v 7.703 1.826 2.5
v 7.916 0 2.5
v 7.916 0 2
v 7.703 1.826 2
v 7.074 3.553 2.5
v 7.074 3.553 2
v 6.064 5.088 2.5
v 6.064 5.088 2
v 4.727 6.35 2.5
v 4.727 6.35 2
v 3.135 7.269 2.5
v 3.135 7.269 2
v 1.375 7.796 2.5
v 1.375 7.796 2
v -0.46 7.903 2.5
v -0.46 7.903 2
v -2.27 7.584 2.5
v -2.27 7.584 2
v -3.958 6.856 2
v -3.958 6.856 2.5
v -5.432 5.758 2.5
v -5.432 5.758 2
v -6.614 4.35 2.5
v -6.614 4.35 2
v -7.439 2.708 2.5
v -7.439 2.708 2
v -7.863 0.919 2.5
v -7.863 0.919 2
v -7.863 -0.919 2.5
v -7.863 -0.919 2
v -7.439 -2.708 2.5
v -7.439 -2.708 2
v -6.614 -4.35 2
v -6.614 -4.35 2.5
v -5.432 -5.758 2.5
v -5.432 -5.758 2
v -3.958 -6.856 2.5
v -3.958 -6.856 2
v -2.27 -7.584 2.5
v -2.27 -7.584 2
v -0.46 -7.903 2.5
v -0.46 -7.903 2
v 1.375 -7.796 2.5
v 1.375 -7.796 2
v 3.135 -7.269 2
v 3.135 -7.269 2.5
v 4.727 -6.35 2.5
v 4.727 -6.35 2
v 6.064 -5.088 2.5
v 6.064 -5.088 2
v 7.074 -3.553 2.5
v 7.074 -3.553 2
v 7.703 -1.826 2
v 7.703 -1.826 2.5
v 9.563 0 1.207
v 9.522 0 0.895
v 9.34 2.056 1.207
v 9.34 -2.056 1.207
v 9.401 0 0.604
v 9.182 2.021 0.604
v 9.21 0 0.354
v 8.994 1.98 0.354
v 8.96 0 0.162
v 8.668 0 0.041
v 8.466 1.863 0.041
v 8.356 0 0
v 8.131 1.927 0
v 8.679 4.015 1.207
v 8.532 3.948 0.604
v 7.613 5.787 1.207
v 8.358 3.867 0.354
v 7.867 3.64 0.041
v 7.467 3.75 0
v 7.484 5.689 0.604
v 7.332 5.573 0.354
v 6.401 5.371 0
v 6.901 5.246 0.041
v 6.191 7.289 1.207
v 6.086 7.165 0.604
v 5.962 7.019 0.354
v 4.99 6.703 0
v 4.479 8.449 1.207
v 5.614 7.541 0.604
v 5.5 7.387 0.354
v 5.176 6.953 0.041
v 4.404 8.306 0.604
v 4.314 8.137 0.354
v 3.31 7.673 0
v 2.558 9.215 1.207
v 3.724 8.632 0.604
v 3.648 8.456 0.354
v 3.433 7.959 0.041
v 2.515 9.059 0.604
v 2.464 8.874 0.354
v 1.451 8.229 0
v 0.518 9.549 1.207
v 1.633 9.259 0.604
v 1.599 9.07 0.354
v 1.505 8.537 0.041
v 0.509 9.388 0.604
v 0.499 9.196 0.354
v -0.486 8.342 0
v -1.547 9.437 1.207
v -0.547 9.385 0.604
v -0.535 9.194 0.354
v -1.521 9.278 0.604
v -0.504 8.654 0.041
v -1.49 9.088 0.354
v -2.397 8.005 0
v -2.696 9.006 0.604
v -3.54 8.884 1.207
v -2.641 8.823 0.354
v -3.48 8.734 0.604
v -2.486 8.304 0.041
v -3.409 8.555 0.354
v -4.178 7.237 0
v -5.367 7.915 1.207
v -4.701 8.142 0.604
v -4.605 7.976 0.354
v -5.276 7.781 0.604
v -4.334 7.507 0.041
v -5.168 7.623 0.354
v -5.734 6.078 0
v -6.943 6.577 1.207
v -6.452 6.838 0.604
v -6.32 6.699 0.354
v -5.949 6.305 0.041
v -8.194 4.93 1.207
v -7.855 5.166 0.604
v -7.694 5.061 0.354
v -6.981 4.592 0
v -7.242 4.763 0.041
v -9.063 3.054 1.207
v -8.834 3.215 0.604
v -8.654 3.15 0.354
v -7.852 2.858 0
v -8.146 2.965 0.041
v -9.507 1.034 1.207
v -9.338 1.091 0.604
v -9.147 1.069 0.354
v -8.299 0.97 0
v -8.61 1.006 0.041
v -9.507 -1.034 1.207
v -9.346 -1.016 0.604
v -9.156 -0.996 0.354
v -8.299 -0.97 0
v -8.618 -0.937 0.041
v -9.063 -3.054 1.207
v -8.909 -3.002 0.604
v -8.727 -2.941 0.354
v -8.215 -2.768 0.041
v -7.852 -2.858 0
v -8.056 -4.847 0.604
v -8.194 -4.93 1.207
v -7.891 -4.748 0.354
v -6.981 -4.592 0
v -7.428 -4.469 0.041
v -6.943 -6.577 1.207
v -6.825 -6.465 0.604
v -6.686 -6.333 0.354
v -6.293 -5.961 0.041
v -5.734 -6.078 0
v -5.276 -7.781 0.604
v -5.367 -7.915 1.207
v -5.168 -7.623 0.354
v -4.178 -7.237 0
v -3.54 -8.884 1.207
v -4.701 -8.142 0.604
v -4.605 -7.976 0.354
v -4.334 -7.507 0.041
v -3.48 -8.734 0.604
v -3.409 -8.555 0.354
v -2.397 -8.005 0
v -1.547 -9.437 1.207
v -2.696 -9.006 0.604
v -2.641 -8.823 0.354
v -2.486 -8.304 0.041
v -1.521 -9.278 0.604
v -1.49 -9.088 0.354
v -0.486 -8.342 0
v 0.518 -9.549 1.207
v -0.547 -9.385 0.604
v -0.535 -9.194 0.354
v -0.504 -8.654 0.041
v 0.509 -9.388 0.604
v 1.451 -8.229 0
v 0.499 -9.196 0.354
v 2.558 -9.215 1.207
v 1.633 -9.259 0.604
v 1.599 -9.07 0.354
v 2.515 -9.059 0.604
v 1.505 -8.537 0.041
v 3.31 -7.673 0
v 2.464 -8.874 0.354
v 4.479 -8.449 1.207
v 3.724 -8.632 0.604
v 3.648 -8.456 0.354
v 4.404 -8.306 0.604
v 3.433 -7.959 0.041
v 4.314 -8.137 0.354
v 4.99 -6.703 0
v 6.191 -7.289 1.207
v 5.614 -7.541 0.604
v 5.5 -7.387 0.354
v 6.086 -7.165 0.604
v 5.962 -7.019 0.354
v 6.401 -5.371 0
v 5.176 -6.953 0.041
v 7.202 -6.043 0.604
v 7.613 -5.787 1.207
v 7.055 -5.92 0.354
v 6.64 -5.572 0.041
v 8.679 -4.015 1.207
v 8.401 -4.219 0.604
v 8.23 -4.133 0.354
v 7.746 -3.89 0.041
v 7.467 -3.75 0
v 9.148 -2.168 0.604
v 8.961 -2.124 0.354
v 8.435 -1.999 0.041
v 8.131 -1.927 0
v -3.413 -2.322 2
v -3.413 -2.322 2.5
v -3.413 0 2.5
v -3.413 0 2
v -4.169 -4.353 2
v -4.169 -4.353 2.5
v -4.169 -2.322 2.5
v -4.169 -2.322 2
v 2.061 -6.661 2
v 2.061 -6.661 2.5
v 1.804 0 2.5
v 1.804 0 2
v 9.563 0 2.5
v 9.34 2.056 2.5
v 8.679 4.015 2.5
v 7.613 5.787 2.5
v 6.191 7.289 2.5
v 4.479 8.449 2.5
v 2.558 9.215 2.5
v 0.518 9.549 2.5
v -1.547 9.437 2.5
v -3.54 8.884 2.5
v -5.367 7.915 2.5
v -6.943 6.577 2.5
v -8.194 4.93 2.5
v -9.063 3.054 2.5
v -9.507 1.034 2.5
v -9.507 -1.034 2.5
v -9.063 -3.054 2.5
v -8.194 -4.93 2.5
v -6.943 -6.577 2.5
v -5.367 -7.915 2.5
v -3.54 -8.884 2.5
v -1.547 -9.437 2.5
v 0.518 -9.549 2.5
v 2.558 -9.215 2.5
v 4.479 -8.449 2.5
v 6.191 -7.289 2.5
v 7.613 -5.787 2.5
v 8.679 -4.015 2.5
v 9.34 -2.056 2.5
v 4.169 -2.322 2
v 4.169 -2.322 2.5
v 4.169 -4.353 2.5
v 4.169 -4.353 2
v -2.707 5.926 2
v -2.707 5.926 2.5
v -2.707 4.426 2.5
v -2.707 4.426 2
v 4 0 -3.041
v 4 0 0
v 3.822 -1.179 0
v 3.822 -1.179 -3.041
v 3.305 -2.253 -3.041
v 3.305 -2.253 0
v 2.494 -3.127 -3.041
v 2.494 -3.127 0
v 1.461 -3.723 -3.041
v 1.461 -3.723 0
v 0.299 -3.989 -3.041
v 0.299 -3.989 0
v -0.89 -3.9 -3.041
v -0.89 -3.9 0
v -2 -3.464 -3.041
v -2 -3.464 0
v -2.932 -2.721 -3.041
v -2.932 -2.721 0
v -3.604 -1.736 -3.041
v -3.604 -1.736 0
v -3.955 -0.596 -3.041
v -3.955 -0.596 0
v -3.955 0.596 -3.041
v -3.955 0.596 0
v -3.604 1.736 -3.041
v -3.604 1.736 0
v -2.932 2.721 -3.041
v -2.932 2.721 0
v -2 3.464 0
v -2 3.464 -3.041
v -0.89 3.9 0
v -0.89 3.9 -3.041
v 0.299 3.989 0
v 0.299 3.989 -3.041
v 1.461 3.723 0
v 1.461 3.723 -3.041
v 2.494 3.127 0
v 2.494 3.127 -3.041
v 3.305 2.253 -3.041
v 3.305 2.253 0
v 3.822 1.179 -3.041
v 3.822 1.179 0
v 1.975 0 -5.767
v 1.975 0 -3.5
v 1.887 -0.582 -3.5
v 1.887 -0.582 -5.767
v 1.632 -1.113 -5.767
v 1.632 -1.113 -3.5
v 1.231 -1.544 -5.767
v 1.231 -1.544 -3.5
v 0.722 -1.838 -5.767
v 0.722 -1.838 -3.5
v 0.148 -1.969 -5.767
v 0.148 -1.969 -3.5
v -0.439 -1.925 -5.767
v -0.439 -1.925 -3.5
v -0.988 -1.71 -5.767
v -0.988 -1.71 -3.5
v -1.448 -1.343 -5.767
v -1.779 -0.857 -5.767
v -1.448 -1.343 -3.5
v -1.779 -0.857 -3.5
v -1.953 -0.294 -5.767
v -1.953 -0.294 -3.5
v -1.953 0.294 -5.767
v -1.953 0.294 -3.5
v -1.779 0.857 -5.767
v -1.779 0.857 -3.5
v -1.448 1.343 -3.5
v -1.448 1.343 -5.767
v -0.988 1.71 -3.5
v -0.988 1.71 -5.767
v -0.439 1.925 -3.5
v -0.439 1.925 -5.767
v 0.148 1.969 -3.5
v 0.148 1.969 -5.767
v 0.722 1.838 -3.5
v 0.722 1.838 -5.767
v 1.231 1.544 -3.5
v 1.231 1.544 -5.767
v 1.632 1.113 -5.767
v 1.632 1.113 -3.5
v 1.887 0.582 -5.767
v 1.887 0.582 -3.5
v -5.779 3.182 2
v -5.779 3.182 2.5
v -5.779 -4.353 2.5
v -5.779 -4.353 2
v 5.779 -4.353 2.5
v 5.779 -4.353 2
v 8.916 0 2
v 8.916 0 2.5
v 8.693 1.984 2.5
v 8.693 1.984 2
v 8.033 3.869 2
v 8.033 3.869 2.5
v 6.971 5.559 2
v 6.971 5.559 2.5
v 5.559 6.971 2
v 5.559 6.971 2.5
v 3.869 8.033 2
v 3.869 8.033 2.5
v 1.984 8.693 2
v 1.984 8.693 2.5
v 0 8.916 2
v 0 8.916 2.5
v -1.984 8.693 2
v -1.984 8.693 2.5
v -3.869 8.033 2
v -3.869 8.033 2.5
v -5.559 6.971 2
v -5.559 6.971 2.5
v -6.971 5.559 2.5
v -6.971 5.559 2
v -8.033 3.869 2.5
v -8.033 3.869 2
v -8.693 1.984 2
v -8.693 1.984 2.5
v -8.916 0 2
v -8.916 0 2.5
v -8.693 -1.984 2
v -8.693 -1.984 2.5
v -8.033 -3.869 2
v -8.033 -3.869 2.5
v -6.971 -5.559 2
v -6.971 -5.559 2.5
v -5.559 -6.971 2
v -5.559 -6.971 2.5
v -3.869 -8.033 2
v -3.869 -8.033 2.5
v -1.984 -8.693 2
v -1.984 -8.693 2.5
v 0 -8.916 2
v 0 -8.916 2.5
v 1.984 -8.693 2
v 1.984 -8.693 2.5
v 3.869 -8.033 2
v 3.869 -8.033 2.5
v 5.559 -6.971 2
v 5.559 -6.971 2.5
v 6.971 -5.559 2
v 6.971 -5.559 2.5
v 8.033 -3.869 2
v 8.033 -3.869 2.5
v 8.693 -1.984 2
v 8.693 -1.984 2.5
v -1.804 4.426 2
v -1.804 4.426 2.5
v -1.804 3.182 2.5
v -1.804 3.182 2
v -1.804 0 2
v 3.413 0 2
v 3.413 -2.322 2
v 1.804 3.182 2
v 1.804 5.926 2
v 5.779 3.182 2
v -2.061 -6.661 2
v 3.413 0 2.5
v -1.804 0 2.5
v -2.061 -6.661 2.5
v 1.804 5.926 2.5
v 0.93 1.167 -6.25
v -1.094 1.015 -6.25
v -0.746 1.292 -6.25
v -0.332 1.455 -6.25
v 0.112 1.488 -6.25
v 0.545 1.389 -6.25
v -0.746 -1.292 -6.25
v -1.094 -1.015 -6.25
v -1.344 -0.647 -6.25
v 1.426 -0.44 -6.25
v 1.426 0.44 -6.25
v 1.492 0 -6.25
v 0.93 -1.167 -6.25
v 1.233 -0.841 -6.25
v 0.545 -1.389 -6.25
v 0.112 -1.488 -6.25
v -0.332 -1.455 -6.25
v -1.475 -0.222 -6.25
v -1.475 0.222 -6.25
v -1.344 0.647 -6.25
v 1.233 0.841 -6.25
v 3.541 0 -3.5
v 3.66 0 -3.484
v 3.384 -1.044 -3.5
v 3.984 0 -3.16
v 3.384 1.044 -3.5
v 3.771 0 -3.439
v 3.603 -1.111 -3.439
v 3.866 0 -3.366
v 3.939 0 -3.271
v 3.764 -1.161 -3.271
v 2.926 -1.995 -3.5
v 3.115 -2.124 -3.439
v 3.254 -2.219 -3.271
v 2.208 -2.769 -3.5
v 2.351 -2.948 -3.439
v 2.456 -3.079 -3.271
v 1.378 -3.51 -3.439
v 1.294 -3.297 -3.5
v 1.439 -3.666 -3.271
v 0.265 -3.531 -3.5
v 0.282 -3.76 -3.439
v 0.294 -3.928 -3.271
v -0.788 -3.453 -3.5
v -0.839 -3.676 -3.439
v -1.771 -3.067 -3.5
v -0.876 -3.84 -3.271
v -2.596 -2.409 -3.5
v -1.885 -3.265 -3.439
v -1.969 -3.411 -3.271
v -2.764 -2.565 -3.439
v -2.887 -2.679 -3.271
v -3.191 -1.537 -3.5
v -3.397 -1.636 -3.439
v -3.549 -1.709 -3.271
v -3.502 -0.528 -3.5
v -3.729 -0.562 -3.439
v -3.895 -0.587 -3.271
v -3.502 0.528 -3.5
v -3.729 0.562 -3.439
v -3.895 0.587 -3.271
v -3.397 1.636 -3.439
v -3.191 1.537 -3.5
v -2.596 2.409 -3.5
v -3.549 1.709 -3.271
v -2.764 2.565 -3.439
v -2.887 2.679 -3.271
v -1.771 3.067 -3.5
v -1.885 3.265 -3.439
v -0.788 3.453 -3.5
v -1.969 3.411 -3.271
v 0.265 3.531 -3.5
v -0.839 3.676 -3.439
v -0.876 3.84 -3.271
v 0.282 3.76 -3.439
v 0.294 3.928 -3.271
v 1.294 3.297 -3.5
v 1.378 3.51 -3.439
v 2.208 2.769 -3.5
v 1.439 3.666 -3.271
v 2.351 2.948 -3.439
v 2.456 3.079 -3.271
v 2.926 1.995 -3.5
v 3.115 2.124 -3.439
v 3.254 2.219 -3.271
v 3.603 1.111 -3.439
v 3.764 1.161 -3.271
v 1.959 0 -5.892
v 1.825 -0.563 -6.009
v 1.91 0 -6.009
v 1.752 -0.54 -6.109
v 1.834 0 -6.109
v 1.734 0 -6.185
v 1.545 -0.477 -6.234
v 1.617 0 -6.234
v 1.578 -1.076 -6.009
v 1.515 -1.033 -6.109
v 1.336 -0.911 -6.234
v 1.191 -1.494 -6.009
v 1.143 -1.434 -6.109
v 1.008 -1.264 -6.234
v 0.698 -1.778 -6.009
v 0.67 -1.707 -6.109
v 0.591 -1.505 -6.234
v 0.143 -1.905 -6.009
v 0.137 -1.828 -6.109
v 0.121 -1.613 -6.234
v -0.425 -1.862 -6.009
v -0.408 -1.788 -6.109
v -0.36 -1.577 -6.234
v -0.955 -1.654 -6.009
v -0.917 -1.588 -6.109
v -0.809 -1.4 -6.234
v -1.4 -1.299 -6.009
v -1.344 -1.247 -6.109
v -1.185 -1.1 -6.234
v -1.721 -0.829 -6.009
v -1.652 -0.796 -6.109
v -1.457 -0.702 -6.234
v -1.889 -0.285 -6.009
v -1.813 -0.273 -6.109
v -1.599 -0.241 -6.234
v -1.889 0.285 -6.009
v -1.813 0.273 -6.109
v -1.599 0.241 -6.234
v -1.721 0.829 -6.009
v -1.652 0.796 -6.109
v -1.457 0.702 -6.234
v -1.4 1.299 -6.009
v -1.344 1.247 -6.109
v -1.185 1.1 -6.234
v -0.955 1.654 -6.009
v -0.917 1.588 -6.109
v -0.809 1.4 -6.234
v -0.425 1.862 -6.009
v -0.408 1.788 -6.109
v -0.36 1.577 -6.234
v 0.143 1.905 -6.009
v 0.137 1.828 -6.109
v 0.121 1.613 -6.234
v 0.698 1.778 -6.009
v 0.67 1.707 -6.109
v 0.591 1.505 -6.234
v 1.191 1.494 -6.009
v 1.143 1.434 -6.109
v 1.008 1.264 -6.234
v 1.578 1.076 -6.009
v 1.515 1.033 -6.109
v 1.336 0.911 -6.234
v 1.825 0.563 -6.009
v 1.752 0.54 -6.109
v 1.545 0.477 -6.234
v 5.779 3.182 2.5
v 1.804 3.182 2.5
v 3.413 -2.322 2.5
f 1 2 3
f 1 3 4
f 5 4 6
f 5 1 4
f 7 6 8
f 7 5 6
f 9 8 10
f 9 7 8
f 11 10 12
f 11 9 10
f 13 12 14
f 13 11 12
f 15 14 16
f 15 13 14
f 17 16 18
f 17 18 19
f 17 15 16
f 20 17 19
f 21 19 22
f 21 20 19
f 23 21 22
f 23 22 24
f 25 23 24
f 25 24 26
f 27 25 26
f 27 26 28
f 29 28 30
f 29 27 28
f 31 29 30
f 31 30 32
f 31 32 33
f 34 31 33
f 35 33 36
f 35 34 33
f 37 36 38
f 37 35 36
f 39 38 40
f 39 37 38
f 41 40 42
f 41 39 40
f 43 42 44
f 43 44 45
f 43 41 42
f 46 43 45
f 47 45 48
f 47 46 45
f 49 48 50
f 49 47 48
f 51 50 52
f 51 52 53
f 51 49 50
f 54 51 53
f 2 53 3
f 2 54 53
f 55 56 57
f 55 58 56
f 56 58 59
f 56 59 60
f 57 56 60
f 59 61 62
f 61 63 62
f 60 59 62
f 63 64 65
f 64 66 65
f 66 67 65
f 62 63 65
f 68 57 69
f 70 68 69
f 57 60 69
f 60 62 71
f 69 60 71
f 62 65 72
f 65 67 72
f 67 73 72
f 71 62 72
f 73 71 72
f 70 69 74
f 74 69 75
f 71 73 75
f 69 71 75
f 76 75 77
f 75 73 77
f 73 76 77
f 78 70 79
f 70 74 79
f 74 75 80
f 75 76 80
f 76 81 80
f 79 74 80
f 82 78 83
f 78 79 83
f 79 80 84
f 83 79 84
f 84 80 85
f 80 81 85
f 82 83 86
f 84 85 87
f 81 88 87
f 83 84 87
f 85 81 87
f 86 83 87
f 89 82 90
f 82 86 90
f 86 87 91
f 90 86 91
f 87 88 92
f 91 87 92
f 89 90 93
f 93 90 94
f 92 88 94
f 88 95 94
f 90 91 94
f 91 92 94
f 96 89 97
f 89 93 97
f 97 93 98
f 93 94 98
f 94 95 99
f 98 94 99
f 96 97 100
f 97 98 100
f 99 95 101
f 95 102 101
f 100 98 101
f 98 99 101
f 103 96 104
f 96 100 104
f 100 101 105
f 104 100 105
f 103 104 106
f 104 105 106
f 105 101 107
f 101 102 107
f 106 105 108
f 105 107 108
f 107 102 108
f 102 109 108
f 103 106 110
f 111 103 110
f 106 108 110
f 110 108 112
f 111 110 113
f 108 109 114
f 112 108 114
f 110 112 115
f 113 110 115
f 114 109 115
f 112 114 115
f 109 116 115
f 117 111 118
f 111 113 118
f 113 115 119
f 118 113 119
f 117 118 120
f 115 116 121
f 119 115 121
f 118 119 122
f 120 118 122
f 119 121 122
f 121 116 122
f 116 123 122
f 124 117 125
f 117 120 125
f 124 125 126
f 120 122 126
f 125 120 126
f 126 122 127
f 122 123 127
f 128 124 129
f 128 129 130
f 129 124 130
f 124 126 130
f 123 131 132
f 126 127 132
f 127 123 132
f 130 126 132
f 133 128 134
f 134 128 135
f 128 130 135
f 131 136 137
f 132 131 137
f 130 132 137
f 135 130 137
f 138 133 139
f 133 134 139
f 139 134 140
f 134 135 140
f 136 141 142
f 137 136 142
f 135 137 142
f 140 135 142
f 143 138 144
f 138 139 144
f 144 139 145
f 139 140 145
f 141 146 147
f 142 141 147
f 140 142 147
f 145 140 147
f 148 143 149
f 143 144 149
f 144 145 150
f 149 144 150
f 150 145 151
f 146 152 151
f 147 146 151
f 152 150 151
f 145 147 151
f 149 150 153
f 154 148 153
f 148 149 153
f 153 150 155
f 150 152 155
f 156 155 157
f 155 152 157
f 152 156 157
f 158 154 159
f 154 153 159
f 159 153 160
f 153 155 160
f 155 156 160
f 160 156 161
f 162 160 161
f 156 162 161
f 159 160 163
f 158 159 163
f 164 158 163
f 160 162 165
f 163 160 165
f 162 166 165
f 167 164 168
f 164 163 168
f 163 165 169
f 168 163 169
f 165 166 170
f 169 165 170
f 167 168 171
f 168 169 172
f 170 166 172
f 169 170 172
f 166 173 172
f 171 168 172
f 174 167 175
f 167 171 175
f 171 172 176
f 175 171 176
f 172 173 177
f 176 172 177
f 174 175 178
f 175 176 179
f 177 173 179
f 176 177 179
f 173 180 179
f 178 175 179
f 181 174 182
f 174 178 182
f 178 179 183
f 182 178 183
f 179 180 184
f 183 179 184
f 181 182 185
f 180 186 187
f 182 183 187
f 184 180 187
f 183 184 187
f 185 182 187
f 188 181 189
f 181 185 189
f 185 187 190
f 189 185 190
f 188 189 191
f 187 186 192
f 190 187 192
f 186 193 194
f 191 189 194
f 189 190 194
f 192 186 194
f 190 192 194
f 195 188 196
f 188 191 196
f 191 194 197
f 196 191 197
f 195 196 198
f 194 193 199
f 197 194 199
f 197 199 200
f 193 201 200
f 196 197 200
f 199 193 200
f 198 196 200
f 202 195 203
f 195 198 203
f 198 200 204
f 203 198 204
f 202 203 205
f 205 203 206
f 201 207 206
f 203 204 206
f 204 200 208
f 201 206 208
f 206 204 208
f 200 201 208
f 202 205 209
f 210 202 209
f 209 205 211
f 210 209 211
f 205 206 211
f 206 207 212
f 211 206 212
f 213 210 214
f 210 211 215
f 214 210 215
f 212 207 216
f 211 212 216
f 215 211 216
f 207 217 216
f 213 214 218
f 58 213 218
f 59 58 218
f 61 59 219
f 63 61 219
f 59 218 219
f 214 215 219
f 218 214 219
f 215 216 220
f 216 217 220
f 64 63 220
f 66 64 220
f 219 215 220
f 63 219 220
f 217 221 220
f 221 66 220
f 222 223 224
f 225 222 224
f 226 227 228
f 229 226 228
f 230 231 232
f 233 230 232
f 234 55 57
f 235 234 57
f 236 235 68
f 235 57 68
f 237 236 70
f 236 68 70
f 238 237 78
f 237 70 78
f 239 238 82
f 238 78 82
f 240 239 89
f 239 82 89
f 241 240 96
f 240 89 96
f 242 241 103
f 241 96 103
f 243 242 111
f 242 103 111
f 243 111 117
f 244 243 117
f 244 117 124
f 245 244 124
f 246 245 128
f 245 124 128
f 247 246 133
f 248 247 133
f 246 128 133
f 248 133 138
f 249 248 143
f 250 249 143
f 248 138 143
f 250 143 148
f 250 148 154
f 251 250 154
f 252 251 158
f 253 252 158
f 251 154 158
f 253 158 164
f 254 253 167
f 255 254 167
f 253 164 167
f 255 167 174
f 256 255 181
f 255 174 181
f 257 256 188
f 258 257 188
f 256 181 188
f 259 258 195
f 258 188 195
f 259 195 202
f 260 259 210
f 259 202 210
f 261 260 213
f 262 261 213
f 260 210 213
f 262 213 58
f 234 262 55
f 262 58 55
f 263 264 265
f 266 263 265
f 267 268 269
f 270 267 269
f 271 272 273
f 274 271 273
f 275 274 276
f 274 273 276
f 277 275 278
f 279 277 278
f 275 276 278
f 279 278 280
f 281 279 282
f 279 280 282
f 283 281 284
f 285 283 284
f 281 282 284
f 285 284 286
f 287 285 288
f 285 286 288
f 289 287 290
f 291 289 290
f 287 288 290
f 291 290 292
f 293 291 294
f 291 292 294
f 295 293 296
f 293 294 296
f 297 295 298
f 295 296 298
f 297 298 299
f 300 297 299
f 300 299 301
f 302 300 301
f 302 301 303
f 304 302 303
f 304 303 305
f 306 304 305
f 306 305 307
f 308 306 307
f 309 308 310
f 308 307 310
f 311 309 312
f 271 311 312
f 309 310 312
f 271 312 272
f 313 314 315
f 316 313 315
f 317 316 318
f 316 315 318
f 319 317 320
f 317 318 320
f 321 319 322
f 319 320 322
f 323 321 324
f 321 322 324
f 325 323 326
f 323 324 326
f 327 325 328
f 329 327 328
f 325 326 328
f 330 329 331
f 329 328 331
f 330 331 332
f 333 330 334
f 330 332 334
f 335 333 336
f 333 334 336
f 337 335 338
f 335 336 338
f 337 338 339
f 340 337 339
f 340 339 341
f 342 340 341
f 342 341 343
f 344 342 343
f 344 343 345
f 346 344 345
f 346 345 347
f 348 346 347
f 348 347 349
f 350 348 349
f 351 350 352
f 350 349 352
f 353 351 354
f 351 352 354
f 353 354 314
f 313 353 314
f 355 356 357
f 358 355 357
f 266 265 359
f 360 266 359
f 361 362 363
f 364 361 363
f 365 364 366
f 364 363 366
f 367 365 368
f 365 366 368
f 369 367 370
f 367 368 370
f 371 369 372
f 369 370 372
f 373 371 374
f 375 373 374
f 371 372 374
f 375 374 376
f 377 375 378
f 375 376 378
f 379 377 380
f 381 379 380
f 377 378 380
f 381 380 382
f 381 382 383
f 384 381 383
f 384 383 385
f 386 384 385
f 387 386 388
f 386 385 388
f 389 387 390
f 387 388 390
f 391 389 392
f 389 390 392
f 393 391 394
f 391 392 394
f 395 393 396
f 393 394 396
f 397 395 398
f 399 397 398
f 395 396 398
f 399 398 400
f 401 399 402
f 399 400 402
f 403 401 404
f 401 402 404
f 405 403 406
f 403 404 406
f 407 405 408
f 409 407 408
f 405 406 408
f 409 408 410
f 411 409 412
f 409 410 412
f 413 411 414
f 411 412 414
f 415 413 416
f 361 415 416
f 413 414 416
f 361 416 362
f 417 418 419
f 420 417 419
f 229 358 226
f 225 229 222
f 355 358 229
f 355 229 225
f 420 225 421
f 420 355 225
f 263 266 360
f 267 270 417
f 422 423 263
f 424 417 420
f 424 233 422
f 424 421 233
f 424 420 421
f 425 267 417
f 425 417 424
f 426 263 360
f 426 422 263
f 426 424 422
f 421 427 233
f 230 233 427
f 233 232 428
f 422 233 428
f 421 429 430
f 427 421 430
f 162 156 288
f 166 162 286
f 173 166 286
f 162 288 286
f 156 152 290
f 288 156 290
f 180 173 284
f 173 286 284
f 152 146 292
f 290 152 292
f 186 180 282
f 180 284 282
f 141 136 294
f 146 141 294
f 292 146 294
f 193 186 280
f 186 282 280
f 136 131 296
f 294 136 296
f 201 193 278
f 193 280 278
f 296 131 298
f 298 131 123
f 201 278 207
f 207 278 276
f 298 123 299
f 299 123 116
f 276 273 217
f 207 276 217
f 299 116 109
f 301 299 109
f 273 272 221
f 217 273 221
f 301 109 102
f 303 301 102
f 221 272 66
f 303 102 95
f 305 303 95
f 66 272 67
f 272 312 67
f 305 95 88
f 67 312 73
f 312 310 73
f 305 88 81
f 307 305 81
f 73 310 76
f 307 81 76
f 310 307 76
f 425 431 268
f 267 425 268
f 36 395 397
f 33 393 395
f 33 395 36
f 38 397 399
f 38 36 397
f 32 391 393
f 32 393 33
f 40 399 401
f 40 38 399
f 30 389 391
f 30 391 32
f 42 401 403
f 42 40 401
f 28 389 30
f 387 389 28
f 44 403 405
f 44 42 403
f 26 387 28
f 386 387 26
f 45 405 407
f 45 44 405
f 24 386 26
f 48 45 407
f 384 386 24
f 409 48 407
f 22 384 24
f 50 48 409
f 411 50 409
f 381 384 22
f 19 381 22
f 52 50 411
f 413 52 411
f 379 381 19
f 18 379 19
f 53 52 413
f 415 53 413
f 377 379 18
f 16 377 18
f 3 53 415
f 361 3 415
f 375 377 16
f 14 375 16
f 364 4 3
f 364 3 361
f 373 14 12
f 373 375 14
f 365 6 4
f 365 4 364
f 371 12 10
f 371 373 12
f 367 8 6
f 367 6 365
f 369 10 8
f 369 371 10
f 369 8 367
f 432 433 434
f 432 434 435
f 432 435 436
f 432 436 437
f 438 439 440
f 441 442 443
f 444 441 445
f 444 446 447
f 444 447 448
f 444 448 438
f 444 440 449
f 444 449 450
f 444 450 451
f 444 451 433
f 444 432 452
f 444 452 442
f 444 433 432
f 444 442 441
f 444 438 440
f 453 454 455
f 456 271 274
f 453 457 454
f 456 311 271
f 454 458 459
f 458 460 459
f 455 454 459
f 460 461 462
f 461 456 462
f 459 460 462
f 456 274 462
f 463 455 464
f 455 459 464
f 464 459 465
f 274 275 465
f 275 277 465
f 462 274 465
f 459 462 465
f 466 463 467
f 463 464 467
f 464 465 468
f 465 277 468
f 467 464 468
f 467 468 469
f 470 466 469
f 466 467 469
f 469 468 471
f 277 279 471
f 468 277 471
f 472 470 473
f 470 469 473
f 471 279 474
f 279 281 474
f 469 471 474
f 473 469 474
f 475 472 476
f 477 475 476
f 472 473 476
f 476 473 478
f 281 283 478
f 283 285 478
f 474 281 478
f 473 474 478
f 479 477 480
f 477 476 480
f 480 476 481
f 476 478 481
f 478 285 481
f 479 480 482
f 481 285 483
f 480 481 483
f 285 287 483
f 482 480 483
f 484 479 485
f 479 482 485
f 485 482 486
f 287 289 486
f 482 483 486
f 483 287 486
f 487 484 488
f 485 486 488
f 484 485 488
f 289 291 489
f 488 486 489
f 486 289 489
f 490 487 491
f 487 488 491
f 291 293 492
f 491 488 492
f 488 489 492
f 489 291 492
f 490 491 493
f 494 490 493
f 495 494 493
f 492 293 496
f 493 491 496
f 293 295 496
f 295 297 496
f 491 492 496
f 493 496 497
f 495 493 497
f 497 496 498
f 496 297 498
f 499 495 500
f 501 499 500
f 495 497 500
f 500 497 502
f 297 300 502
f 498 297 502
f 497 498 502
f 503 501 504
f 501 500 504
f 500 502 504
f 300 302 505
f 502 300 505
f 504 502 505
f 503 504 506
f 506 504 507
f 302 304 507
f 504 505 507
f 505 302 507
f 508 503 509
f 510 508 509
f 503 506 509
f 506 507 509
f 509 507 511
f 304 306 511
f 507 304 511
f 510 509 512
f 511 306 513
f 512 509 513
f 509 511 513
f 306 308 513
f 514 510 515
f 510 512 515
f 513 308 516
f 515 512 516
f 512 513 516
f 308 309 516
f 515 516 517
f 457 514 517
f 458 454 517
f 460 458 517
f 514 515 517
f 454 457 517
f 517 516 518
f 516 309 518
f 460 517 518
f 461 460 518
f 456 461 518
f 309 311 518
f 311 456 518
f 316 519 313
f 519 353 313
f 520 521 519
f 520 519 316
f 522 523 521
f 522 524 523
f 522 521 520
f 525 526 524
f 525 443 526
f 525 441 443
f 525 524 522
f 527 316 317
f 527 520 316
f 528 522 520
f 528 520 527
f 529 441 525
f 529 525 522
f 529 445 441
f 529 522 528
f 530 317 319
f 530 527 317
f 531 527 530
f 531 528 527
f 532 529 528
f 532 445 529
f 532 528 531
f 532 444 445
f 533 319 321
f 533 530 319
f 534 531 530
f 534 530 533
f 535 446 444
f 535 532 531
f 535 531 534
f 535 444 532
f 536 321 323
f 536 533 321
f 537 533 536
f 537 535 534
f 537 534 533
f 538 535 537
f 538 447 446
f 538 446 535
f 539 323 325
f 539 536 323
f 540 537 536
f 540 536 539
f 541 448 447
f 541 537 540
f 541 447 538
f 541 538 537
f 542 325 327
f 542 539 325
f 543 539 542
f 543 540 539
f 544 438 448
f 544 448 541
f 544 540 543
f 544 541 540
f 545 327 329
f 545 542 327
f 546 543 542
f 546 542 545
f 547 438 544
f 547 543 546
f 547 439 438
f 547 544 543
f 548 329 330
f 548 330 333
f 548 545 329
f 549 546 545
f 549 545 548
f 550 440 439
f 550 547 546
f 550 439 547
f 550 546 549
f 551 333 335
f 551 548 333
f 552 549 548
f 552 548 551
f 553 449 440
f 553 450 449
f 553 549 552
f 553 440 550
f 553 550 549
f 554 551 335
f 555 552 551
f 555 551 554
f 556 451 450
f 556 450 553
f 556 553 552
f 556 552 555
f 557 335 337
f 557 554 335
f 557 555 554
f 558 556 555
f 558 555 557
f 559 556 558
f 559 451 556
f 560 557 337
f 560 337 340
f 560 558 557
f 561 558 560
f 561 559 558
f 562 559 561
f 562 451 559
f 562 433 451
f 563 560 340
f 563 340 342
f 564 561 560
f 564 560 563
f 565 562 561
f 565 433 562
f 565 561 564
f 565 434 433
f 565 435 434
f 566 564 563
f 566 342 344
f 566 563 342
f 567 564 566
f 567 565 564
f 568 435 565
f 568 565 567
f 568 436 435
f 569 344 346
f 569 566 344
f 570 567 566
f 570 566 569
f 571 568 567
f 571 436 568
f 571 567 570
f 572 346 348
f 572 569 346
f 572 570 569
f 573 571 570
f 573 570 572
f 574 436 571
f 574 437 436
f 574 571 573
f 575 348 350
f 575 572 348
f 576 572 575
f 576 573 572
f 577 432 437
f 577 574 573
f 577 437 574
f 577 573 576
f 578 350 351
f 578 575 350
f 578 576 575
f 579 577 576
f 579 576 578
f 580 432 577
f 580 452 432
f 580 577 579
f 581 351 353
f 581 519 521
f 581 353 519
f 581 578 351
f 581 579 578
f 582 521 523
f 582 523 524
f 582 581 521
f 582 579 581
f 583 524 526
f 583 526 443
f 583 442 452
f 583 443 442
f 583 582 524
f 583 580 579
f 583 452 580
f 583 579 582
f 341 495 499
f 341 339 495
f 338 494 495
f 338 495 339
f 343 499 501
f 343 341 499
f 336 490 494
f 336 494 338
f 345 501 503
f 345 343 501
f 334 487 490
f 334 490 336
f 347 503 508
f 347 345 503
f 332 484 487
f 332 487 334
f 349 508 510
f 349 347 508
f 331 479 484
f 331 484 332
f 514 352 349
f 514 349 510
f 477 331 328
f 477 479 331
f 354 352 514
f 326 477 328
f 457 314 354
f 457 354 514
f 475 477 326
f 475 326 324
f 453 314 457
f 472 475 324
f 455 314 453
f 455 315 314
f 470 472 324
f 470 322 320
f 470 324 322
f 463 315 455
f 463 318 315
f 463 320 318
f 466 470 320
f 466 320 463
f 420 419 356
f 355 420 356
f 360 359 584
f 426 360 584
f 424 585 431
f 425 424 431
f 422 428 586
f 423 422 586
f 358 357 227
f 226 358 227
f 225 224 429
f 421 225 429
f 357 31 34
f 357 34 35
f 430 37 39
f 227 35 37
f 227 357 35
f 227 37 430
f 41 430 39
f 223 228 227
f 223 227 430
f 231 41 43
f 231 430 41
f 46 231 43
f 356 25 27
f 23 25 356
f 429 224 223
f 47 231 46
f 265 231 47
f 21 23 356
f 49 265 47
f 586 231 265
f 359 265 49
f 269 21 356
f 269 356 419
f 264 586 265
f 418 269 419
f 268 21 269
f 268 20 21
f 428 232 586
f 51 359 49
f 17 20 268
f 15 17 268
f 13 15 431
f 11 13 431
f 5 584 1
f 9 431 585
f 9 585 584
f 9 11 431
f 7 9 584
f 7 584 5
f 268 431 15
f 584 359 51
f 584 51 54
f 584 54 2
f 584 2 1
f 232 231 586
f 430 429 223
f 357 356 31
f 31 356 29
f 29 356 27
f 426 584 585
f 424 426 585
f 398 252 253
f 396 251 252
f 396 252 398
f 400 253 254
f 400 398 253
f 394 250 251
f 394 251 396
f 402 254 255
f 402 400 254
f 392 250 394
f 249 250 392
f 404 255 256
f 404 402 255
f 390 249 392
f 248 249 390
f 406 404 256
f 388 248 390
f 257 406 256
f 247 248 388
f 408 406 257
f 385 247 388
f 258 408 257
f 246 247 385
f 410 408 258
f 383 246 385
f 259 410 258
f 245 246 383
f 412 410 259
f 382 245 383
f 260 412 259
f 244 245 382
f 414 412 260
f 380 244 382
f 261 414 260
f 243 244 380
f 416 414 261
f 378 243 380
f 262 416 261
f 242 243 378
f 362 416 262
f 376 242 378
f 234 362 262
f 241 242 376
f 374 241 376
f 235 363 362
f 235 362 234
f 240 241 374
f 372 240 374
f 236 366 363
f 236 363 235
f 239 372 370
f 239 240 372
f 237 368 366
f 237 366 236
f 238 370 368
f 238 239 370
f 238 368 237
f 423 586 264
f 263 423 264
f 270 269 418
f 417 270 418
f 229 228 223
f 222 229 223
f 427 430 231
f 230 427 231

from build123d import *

# Parameters (mm, degrees)
F0_R     = 9.5631
F1_DEPTH = 2.5
F2_R     = 8.9162314004
F2_R_2   = 7.9162314004
F3_DEPTH = 0.5
F4_R     = 4
F5_DEPTH = 3.5
F6_R     = 1.2071067812
F7_R     = 1.975
F8_DEPTH = 2.75
F9_R     = 0.4828427125
F10_R    = 0.4587005769


with BuildPart() as f1:
    # F0 (on Top) → F1 (new body)
    with BuildSketch(Plane.XY):
        Circle(F0_R)
    extrude(amount=F1_DEPTH)

    # F2 (on face) → F3 (cut)
    with BuildSketch(Plane.XY.offset(2.5)):
        Circle(F2_R)
        Circle(F2_R_2, mode=Mode.SUBTRACT)
        Polygon((1.8036346717, 5.9258921407), (-2.7067440096, 5.9258921407), (-2.7067440096, 4.4258921407), (-1.8036346717, 4.4258921407), (-1.8036346717, 3.1822535675), (-5.7792644948, 3.1822535675), (-5.7792644948, -4.3527372181), (-4.1694175287, -4.3527372181), (-4.1694175287, -2.3218090646), (-3.4134816378, -2.3218090646), (-3.4134816378, 0), (-1.8036346717, 0), (-2.0609125495, -6.6612055525), (0, -6.6612055525), (2.0609125495, -6.6612055525), (1.8036346717, 0), (3.4134816378, 0), (3.4134816378, -2.3218090646), (4.1694175287, -2.3218090646), (4.1694175287, -4.3527372181), (5.7792644948, -4.3527372181), (5.7792644948, 3.1822535675), (1.8036346717, 3.1822535675), align=None)
    extrude(amount=-F3_DEPTH, mode=Mode.SUBTRACT)

    # F4 (on face) → F5 (join)
    with BuildSketch(Plane(origin=(0, 0, 0), x_dir=(1, 0, 0), z_dir=(0, 0, -1))):
        Circle(F4_R)
    extrude(amount=F5_DEPTH)

    # F6
    f6_edges = [f1.edges().sort_by_distance(p)[0] for p in [
        (-9.5631, 0, 0),
    ]]
    fillet(f6_edges, radius=F6_R)

    # F7 (on face) → F8 (join)
    with BuildSketch(Plane(origin=(0, 0, -3.5), x_dir=(1, 0, 0), z_dir=(0, 0, -1))):
        Circle(F7_R)
    extrude(amount=F8_DEPTH)

    # F9
    f9_edges = [f1.edges().sort_by_distance(p)[0] for p in [
        (-1.975, 0, -6.25),
    ]]
    fillet(f9_edges, radius=F9_R)

    # F10
    f10_edges = [f1.edges().sort_by_distance(p)[0] for p in [
        (-4, 0, -3.5),
    ]]
    fillet(f10_edges, radius=F10_R)


solid = f1.part
